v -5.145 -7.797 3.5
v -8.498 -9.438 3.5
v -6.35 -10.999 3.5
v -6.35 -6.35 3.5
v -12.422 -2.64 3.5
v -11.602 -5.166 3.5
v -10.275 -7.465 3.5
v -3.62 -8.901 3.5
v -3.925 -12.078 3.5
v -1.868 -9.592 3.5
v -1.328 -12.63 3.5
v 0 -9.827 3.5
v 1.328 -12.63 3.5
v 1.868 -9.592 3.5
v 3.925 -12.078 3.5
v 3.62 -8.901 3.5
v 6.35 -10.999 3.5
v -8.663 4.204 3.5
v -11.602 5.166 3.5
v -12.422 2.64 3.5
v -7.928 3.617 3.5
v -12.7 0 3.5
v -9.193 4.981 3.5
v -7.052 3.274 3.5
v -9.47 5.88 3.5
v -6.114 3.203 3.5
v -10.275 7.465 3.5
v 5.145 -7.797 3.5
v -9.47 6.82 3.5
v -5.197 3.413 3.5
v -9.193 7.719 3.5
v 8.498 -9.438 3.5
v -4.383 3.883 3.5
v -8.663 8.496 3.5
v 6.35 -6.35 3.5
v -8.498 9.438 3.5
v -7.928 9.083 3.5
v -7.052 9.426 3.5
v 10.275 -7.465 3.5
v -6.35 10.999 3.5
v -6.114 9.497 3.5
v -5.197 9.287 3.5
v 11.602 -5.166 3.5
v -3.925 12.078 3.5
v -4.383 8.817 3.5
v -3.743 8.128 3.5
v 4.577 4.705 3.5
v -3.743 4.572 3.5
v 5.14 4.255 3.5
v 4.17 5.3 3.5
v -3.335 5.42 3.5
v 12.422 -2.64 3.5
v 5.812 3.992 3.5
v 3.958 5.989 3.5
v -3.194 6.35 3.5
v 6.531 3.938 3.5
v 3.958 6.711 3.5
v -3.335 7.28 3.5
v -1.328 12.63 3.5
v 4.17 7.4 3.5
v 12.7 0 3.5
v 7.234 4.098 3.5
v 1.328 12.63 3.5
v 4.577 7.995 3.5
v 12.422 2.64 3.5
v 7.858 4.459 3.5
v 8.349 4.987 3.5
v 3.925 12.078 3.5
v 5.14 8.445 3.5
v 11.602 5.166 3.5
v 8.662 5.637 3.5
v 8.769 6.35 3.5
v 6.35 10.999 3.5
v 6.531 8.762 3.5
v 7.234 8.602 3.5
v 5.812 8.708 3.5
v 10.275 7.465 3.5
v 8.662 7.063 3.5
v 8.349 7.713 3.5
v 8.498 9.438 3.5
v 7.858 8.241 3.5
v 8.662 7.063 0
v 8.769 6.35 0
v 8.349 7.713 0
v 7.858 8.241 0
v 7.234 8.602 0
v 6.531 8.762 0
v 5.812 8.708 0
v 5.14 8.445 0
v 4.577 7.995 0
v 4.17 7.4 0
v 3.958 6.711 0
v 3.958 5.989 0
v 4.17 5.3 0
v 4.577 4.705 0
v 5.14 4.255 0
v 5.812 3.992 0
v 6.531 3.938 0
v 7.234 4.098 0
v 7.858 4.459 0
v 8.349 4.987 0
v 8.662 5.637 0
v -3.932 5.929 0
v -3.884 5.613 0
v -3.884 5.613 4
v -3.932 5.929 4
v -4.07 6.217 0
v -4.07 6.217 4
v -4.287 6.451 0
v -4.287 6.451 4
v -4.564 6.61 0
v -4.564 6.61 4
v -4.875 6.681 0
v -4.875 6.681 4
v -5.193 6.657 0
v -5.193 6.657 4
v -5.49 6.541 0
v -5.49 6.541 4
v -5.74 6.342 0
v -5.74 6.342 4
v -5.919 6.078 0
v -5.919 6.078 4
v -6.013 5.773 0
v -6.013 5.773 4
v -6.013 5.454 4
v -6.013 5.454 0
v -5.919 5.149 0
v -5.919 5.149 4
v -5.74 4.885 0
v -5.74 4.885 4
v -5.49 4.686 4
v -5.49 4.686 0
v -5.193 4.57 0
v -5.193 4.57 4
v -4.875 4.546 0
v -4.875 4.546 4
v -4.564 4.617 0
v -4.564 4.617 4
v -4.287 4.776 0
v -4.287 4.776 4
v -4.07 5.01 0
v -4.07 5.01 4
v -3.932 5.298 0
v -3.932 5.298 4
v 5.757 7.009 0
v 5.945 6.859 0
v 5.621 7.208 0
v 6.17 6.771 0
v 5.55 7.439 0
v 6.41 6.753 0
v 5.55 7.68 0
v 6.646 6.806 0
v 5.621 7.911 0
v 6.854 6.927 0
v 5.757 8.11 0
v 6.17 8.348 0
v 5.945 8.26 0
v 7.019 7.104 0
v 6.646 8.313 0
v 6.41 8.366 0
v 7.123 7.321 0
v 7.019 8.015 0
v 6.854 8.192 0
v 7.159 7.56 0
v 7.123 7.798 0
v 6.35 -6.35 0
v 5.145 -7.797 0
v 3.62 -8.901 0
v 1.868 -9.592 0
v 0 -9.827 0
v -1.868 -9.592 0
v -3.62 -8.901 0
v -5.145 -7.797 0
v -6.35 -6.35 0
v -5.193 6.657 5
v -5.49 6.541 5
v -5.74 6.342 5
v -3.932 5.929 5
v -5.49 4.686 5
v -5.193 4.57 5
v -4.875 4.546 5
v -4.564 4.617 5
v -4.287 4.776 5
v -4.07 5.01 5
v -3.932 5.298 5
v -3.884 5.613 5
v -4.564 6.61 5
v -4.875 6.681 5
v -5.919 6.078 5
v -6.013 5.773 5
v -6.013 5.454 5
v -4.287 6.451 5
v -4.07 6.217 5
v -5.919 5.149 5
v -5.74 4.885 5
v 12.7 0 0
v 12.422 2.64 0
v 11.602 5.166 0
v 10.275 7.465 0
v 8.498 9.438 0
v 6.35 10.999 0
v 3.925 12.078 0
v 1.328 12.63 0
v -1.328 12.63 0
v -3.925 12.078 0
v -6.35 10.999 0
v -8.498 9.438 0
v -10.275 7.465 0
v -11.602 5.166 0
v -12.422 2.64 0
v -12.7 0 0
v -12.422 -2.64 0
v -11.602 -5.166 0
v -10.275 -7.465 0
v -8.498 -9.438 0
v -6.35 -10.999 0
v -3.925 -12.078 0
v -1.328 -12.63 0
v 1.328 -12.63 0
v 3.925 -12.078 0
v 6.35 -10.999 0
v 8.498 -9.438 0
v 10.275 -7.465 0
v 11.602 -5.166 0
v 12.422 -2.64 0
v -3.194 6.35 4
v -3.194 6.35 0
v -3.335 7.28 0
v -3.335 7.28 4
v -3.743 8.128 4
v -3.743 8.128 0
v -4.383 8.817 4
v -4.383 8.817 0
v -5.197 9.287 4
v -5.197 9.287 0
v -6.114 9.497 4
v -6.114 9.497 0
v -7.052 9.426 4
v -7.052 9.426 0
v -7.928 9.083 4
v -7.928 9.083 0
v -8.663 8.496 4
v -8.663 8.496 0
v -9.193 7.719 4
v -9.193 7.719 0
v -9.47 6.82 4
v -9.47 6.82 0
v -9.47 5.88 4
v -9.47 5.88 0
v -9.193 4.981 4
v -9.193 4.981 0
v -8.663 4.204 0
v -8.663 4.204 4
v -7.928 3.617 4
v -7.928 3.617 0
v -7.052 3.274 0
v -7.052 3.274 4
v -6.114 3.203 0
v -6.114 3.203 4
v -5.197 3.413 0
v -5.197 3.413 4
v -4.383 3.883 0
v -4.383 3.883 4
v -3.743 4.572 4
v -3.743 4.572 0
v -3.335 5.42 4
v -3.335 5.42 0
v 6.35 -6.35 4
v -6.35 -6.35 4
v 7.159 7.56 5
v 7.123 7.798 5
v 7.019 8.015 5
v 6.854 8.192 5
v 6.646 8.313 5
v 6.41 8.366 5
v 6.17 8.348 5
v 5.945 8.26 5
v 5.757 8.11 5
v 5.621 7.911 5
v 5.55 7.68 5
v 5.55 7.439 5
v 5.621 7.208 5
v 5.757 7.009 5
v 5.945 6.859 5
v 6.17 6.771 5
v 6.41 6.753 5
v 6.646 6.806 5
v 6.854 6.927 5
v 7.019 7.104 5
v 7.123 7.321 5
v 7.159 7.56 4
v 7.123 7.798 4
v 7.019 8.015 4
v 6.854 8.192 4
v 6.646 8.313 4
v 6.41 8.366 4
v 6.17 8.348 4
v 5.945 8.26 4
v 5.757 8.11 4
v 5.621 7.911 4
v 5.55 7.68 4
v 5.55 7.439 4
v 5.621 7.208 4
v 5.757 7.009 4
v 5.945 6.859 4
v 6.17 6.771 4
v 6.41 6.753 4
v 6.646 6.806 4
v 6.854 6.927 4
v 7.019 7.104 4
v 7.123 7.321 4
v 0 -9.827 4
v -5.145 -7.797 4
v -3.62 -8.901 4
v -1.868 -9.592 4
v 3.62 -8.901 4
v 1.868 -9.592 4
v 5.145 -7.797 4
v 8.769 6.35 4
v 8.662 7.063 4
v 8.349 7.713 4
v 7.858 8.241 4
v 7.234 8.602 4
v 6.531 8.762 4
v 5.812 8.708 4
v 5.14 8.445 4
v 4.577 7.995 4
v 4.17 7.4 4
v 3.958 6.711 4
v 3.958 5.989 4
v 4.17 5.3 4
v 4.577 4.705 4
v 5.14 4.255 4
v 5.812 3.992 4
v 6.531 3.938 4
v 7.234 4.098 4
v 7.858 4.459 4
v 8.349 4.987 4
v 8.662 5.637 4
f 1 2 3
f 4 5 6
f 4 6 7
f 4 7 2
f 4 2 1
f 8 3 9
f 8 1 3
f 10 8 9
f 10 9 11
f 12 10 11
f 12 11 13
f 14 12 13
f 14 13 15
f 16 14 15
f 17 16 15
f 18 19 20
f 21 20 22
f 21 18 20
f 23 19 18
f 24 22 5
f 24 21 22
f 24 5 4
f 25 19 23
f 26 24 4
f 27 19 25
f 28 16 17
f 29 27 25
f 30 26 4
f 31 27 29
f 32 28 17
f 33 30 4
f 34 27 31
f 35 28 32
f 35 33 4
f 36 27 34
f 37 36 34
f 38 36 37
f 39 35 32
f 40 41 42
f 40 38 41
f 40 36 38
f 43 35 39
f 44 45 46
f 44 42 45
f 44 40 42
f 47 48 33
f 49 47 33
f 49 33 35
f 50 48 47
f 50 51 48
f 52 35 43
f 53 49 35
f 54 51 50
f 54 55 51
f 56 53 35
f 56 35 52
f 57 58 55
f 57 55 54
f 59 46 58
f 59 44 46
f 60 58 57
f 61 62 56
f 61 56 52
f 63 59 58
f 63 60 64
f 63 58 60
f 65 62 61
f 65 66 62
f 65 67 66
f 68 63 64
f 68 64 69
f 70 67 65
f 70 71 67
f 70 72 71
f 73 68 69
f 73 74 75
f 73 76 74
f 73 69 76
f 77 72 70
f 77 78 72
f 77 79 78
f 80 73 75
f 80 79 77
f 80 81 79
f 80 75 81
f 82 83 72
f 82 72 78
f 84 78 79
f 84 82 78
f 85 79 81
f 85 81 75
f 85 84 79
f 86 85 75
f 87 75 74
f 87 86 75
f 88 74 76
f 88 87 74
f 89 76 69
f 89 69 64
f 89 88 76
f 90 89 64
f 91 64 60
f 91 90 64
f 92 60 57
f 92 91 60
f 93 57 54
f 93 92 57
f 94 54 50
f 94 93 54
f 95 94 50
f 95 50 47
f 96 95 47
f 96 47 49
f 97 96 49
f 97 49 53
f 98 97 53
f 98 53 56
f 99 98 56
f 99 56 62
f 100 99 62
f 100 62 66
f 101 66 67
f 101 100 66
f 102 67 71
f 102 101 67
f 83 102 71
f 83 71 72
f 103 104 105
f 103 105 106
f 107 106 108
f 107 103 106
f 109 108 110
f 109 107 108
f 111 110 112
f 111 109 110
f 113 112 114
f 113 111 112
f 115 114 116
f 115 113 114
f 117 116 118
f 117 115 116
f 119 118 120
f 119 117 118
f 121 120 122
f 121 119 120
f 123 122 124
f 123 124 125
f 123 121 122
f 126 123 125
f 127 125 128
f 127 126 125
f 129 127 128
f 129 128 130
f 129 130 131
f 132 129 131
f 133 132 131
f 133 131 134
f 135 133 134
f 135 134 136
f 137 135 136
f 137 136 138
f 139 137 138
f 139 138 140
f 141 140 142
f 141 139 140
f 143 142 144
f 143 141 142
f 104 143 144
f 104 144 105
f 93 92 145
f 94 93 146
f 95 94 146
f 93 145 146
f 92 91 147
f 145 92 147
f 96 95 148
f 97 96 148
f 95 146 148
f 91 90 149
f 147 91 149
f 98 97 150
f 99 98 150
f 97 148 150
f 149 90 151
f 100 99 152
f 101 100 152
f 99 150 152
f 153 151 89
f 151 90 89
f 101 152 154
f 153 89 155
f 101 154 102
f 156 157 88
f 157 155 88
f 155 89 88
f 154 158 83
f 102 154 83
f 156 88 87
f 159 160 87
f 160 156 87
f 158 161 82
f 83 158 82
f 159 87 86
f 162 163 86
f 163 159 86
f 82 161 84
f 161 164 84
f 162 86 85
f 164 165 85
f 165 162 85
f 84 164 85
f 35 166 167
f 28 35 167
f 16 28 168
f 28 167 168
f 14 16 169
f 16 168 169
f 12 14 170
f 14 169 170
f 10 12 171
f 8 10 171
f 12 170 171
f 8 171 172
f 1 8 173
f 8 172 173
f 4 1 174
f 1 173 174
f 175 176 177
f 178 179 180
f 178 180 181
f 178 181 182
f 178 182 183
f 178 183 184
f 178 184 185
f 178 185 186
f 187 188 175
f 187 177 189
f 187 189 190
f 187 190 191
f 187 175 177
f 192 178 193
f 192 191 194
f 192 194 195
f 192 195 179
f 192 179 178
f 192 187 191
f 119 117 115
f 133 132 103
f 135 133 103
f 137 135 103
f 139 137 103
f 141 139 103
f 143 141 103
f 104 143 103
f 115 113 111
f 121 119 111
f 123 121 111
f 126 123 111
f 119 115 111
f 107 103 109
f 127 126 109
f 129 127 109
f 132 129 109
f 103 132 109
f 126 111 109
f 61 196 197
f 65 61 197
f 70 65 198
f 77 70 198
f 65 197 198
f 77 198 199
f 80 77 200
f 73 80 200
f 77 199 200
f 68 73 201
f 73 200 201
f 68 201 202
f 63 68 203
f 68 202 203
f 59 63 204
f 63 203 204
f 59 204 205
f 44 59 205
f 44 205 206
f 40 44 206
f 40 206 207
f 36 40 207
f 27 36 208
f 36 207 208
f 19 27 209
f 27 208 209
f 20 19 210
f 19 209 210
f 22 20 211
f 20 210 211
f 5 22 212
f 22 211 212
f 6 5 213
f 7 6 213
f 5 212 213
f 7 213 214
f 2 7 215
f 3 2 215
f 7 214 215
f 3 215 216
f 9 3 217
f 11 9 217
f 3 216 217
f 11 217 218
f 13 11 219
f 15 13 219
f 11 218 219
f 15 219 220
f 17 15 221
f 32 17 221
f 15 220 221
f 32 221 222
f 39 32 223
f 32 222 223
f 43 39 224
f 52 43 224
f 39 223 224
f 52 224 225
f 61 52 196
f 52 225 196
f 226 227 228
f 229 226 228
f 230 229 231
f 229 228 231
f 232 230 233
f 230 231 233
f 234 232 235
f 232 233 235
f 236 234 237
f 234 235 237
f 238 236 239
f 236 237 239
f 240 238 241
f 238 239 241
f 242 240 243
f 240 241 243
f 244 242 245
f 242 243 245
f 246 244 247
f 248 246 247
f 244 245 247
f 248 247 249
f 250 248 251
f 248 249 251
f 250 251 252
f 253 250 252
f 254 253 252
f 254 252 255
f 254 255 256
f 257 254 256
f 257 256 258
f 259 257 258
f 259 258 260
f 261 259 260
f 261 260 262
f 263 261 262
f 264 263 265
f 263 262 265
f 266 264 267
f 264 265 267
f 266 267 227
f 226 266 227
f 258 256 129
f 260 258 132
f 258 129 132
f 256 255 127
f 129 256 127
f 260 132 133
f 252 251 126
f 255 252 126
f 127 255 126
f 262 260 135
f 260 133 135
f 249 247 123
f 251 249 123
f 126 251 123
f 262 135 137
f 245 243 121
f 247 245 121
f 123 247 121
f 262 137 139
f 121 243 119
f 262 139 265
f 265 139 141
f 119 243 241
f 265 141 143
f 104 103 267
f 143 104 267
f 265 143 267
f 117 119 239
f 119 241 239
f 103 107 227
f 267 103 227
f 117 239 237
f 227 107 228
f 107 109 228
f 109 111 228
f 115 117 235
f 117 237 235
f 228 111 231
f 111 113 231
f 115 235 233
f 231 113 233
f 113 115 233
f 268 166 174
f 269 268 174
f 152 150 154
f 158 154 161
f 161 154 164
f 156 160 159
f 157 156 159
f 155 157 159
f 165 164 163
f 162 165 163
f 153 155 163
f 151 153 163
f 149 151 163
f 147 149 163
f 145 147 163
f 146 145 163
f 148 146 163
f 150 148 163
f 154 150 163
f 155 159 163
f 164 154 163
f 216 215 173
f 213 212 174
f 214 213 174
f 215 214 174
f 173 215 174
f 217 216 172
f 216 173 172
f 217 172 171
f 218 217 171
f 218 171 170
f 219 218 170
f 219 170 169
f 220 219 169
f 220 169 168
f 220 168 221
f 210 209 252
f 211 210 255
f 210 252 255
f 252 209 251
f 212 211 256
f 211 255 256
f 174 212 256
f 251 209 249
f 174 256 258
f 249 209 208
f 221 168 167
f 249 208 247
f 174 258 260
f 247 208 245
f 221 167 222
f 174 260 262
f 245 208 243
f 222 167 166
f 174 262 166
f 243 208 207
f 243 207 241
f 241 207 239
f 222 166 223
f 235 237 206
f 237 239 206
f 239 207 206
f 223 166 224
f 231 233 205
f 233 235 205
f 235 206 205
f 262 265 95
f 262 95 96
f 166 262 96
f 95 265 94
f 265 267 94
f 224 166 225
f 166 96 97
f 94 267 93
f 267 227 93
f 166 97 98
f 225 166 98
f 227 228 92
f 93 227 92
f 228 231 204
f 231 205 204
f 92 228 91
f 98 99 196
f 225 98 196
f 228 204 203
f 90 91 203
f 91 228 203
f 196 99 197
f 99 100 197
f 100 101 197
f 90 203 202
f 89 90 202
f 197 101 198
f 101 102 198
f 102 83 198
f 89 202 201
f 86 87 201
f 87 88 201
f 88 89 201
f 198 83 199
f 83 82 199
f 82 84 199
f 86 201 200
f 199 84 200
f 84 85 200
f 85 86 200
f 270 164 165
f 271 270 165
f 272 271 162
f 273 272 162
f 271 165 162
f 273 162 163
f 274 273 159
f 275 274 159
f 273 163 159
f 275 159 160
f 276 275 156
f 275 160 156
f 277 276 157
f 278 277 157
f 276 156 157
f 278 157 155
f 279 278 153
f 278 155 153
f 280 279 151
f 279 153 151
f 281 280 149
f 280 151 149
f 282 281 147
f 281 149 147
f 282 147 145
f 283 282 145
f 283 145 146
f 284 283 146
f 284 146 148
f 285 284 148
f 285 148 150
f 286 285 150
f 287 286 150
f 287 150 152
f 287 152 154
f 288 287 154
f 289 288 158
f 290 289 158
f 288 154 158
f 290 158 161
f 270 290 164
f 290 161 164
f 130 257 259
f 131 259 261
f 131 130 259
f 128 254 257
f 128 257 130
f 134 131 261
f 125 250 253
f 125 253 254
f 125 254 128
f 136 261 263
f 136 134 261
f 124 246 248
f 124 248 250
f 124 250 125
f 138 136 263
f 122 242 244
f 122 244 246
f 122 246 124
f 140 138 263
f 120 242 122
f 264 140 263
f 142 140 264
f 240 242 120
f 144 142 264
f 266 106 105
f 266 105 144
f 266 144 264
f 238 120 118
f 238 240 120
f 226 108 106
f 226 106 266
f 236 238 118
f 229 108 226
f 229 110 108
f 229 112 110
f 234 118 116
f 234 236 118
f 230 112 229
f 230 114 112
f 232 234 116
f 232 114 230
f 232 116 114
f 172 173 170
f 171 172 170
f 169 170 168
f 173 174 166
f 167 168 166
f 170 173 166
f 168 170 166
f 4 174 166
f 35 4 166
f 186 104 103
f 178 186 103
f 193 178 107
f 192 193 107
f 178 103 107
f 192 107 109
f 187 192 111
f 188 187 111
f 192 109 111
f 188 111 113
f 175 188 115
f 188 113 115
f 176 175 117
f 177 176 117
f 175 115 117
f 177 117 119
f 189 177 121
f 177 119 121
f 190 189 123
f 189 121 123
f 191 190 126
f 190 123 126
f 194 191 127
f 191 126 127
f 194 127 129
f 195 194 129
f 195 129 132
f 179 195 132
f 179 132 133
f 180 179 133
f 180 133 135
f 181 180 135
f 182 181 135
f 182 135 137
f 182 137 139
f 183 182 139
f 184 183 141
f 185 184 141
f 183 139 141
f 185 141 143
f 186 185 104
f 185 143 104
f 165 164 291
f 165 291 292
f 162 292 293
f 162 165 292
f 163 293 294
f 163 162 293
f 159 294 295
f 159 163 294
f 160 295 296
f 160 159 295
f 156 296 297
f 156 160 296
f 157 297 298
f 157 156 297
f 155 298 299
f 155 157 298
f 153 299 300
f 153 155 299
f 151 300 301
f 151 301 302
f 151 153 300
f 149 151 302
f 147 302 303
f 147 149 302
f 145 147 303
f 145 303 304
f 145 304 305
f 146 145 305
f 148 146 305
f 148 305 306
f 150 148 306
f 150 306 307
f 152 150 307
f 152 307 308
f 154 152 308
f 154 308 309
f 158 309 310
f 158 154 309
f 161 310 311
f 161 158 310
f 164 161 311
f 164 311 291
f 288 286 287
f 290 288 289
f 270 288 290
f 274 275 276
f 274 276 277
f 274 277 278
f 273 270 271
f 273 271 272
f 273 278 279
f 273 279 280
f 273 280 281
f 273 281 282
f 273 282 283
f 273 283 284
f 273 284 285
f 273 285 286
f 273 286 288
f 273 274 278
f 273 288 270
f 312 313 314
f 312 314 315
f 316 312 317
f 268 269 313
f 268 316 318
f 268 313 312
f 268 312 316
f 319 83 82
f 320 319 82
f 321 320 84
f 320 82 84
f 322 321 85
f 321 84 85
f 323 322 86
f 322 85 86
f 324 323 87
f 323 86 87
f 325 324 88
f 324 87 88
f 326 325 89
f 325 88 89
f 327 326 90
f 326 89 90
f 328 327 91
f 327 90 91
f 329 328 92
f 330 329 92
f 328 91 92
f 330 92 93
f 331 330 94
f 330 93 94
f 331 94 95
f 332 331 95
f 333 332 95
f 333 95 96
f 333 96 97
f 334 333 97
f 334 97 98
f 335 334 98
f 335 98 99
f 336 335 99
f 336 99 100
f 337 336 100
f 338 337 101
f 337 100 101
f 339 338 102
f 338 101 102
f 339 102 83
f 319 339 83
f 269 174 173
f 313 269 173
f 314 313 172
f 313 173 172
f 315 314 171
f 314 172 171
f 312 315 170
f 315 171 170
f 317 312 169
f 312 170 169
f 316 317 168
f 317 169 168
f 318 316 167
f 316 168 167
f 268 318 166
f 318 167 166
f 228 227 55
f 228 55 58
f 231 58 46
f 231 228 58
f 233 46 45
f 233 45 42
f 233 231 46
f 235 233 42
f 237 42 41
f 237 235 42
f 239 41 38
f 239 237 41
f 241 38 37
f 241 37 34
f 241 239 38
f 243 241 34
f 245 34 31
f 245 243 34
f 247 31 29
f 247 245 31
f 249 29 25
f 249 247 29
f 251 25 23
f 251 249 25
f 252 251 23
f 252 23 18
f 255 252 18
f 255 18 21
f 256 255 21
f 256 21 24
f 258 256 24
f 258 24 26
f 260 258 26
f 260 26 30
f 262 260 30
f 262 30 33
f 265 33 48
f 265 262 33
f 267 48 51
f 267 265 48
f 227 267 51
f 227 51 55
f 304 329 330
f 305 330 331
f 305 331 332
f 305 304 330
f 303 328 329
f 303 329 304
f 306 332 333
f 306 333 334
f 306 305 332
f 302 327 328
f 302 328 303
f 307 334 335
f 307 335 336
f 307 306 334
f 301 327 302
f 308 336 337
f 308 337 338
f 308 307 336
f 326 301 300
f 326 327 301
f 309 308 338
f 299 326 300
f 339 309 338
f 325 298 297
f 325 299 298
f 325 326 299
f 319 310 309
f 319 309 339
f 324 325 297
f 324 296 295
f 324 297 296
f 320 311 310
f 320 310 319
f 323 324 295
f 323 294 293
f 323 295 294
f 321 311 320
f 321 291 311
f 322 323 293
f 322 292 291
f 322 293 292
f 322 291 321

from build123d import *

# Parameters (mm, degrees)
F0_R     = 1.070712
F0_R_2   = 0.809145
F1_DEPTH = 5
F0_R_3   = 3.155534
F0_R_4   = 2.41914
F2_DEPTH = 4
F0_R_5   = 12.7
F3_DEPTH = 3.5


with BuildPart() as f1:
    # F0 (on Top) → F1 (new body)
    with BuildSketch(Plane.XY):
        with Locations((-4.954685, 5.613492)):
            Circle(F0_R)
        with Locations((6.35, 7.55957)):
            Circle(F0_R_2)
    extrude(amount=F1_DEPTH)


with BuildPart() as f2:
    # F0 (on Top) → F2 (new body)
    with BuildSketch(Plane.XY):
        with Locations((-6.35, 6.35)):
            Circle(F0_R_3)
        with Locations((-4.954685, 5.613492)):
            Circle(F0_R, mode=Mode.SUBTRACT)
        with Locations((6.35, 6.35)):
            Circle(F0_R_4)
        with Locations((6.35, 7.55957)):
            Circle(F0_R_2, mode=Mode.SUBTRACT)
        with BuildLine():
            Line((6.35, -6.35), (-6.35, -6.35))
            ThreePointArc((-6.35, -6.35), (0, -9.826816), (6.35, -6.35))
        make_face()
    extrude(amount=F2_DEPTH)


with BuildPart() as f3:
    # F0 (on Top) → F3 (new body)
    with BuildSketch(Plane.XY):
        Circle(F0_R_5)
        with BuildLine():
            ThreePointArc((6.35, -6.35), (0, -9.826816), (-6.35, -6.35))
            Line((-6.35, -6.35), (6.35, -6.35))
        make_face(mode=Mode.SUBTRACT)
        with Locations((-6.35, 6.35)):
            Circle(F0_R_3, mode=Mode.SUBTRACT)
        with Locations((6.35, 6.35)):
            Circle(F0_R_4, mode=Mode.SUBTRACT)
    extrude(amount=F3_DEPTH)


solid = Compound([f1.part, f2.part, f3.part])
